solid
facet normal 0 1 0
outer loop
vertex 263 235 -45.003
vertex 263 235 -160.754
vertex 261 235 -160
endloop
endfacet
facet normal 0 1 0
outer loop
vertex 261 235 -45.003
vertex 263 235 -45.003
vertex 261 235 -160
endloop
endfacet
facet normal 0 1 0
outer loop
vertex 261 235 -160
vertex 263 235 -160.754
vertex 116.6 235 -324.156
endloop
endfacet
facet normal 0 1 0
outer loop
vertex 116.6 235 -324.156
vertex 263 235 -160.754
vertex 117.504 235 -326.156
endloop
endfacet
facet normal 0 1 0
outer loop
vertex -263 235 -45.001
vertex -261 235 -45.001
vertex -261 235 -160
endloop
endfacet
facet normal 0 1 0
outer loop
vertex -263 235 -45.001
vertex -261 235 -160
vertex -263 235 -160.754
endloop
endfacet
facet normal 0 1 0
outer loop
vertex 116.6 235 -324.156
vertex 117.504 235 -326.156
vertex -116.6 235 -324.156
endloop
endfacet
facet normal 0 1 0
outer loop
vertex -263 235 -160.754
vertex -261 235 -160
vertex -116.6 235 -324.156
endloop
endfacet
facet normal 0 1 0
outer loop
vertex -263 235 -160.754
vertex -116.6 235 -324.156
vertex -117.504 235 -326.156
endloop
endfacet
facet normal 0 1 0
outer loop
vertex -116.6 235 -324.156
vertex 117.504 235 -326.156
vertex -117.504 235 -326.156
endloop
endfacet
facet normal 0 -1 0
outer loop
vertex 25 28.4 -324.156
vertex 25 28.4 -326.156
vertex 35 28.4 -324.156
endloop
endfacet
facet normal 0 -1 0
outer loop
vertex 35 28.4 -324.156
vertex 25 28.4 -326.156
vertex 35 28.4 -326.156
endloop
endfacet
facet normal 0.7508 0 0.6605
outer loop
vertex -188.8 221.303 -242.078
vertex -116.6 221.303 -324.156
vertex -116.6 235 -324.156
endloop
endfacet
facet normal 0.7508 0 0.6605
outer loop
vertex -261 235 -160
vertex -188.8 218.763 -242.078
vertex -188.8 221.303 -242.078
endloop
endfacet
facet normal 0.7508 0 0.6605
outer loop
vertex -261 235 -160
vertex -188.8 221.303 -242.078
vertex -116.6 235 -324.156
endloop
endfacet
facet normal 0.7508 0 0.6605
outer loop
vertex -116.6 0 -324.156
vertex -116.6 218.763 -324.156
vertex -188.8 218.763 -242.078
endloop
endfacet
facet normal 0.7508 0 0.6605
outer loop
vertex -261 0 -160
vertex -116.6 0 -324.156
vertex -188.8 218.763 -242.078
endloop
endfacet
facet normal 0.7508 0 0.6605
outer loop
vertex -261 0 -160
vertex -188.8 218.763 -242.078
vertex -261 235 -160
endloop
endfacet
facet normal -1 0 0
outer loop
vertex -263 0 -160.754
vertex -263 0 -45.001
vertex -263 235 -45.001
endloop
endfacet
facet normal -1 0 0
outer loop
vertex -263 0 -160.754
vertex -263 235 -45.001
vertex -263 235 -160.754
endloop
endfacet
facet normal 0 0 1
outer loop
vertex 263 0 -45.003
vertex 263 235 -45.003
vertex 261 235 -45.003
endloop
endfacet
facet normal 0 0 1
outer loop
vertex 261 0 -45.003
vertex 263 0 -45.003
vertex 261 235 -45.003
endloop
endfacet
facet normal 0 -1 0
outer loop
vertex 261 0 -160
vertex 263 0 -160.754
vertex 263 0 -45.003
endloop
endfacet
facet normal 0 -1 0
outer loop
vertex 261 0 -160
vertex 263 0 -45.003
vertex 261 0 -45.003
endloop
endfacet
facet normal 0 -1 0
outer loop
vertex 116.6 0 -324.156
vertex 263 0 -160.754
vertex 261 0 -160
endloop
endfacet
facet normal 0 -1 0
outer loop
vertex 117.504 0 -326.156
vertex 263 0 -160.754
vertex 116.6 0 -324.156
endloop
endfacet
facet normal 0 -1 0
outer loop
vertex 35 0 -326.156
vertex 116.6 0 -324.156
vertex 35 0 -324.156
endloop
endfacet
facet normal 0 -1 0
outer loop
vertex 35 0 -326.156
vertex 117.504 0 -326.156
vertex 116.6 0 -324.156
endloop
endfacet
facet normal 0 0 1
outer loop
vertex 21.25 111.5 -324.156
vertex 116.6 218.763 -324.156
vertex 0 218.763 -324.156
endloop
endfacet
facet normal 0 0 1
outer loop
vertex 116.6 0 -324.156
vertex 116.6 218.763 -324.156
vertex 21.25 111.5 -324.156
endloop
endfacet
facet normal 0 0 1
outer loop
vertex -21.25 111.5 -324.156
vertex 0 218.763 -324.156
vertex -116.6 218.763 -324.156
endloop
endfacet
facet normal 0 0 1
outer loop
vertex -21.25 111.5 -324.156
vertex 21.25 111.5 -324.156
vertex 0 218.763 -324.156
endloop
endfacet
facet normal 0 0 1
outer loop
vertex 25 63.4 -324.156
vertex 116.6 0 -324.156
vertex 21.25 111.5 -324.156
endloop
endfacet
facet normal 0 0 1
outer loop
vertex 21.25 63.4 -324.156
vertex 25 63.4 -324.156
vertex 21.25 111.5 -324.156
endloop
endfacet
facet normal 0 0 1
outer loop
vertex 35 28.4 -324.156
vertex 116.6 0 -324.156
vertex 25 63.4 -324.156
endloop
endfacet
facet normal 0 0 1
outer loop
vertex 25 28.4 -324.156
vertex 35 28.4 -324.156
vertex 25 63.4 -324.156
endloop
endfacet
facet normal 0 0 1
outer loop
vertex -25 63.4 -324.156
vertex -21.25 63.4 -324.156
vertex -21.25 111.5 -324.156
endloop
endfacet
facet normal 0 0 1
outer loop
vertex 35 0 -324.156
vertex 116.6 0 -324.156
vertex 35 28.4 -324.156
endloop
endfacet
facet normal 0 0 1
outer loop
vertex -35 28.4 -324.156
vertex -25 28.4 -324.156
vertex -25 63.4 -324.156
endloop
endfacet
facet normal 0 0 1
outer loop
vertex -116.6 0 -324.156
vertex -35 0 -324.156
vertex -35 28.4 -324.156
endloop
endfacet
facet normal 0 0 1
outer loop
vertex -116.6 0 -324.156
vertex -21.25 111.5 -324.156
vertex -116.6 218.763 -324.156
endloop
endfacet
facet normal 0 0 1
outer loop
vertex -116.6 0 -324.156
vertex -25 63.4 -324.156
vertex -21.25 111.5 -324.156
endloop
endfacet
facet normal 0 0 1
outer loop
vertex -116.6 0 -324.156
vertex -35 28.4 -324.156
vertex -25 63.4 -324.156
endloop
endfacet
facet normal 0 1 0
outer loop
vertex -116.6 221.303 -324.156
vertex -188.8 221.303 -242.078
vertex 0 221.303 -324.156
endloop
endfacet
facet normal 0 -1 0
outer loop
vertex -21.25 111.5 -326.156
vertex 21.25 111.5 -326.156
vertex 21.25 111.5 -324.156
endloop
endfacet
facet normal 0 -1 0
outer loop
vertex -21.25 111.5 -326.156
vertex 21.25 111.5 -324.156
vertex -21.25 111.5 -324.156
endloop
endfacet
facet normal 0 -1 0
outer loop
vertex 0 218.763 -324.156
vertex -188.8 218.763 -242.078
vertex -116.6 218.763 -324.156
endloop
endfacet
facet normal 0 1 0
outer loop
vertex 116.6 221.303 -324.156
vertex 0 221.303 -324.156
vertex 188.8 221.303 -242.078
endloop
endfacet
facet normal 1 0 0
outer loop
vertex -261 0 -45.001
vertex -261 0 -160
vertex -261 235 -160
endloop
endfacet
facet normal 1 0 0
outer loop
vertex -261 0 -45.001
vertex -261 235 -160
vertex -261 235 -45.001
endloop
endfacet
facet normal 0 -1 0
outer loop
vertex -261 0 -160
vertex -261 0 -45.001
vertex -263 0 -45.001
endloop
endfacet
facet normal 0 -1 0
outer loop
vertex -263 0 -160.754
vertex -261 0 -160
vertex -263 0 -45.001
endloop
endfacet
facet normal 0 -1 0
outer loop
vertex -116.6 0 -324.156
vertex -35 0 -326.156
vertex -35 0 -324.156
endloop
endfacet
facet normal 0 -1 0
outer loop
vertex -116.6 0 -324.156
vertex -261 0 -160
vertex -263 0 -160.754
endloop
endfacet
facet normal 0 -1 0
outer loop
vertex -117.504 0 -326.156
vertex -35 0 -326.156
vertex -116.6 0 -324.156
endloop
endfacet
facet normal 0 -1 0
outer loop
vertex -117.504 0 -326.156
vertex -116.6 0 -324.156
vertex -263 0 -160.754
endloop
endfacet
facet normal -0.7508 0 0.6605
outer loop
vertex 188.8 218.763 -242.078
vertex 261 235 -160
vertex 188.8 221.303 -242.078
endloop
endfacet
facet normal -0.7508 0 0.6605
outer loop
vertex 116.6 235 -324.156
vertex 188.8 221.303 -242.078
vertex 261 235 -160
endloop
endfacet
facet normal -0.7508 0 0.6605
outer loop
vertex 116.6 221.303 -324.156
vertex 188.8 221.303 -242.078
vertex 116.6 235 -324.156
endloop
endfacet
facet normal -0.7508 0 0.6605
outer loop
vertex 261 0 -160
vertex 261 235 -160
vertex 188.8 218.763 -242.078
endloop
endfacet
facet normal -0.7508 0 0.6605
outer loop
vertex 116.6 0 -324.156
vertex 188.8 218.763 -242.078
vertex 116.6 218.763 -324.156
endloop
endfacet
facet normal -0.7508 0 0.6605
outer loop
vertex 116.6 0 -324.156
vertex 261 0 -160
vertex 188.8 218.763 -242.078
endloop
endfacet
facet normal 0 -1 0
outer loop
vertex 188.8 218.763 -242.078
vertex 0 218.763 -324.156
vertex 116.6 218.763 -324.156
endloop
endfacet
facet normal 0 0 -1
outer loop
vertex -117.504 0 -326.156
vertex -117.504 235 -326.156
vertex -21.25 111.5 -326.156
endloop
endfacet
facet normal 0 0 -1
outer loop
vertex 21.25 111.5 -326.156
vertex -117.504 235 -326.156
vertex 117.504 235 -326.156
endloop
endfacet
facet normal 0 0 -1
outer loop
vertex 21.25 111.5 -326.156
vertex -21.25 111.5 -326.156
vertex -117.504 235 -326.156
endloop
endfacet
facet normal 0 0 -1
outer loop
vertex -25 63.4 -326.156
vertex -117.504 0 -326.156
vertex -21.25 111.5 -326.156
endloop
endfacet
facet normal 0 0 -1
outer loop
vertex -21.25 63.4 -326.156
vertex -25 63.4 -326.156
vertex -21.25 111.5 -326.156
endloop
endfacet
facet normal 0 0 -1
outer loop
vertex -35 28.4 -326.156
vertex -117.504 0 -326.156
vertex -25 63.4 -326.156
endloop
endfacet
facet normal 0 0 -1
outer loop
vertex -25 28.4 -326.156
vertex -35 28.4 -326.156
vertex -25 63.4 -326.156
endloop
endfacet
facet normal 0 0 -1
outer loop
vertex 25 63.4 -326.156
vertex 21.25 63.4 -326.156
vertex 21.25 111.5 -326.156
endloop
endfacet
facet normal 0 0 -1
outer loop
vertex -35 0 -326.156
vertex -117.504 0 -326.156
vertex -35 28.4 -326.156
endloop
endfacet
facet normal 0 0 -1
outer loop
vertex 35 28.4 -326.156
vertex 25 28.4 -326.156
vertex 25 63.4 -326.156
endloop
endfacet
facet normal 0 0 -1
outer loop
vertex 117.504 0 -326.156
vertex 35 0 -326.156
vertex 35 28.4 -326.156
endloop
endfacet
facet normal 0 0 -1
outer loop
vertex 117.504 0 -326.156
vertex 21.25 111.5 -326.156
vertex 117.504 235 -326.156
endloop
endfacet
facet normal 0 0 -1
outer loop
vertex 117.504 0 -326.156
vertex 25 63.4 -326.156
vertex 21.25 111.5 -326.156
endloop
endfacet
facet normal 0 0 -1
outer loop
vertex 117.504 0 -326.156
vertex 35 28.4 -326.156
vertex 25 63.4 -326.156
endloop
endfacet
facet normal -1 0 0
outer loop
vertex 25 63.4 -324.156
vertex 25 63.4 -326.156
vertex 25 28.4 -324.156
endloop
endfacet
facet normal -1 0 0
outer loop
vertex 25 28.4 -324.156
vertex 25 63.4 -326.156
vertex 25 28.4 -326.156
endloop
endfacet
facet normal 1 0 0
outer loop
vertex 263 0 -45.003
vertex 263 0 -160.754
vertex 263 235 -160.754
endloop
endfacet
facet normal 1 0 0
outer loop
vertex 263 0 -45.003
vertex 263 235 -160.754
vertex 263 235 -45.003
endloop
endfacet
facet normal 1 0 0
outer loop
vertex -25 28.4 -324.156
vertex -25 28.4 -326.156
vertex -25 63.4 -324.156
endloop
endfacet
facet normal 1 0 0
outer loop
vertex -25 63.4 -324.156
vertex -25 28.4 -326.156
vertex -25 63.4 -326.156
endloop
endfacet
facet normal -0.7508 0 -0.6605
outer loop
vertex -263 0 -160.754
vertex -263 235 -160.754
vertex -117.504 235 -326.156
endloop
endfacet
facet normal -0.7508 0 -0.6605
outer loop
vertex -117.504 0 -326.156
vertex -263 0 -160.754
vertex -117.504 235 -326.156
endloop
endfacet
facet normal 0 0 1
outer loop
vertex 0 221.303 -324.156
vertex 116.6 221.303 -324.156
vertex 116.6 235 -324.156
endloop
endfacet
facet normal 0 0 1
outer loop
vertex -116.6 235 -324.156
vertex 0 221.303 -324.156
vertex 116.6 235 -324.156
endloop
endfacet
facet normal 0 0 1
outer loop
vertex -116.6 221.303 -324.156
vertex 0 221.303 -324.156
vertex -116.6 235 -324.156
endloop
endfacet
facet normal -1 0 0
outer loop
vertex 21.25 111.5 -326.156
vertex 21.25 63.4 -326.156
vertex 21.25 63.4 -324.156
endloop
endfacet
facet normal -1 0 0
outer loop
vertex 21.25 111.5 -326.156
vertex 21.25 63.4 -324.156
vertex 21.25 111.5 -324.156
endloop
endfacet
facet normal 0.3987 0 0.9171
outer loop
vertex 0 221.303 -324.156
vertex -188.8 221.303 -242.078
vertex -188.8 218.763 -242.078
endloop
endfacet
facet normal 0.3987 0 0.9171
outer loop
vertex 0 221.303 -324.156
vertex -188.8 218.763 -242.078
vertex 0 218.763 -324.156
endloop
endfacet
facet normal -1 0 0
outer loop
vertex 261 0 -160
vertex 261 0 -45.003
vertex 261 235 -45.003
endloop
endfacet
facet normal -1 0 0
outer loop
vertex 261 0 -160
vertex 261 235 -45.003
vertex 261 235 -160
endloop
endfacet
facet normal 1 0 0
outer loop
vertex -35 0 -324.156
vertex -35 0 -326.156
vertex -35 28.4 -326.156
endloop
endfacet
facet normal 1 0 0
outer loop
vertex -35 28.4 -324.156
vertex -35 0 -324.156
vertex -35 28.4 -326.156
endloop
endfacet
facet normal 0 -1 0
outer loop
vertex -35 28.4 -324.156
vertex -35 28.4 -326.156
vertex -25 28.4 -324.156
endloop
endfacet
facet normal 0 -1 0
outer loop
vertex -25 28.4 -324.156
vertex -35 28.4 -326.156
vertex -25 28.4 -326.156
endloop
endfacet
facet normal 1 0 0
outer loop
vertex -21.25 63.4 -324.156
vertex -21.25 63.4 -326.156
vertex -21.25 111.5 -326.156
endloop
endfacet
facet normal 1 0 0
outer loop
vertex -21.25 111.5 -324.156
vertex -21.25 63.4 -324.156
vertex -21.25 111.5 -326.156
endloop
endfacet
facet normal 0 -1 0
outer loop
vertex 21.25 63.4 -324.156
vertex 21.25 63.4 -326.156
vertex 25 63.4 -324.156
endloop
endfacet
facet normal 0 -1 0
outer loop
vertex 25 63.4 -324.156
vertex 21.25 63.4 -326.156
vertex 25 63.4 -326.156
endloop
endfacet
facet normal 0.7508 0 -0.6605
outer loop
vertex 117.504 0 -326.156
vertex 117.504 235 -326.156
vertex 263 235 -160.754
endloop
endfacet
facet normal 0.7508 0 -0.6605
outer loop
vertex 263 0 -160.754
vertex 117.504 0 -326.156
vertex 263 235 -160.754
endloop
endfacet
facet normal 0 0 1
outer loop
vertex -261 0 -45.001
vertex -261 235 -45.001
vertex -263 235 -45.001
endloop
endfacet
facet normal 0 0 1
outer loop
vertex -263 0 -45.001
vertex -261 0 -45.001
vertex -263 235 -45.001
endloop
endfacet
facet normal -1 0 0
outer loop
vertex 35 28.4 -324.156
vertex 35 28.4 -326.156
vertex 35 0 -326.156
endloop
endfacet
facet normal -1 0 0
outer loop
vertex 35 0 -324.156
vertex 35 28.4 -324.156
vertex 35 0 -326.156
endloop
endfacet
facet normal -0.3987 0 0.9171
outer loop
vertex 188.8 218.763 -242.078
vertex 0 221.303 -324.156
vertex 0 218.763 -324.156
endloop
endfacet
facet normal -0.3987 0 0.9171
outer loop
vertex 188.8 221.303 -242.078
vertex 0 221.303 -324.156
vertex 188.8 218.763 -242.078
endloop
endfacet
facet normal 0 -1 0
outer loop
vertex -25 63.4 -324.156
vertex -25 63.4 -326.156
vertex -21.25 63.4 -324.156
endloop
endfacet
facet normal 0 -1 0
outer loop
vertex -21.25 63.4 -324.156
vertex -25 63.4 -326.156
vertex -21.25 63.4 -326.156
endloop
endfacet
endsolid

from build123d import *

# Parameters (mm, degrees)
BOSS_EXTRUDE5_DEPTH = 234.9999999
SKETCH4_W           = 42.5
SKETCH4_H           = 48.09999997
CUT_EXTRUDE1_DEPTH  = 2.000000064
RIB1_REACH          = 504.592
SKETCH9_WALLS_W     = 1213.053497679
SKETCH9_WALLS_H     = 2.54
RIB2_REACH          = 504.592
SKETCH8_WALLS_W     = 1213.053497679
SKETCH8_WALLS_H     = 2.54


with BuildPart() as part:
    # Sketch1 → Boss-Extrude5 (new body)
    with BuildSketch(Plane(origin=(0, 0, 0), x_dir=(1, 0, 0), z_dir=(0, 1, 0))):
        Polygon((-117.504462868, 326.155640462), (117.504462868, 326.155640462), (263.000000064, 160.754471715), (263.000000064, 45.003453118), (261, 45.003453118), (261, 160), (116.600094822, 324.155640398), (-116.600094822, 324.155640398), (-261, 160), (-261, 45.001214275), (-263.000000064, 45.001214275), (-263.000000064, 160.754471715), align=None)
    extrude(amount=BOSS_EXTRUDE5_DEPTH)

    # Sketch4 → Cut-Extrude1 (cut)
    with BuildSketch(Plane(origin=(0, 0, -326.155640462), x_dir=(-1, 0, 0), z_dir=(0, 0, -1))):
        with Locations((0, 87.449999931)):
            Rectangle(SKETCH4_W, SKETCH4_H)
        Polygon((-25, 63.399999946), (-25, 28.4), (25, 28.4), (25, 63.399999946), (21.25, 63.399999946), (-21.25, 63.399999946), align=None)
        Polygon((-25, 28.4), (-35, 28.4), (-35, 0), (35, 0), (35, 28.4), (25, 28.4), align=None)
    extrude(amount=-CUT_EXTRUDE1_DEPTH, mode=Mode.SUBTRACT)

    # Sketch9 walls → Rib1 (add, up to next)
    with BuildSketch(Plane(origin=(118.5216607, 0, -272.630231957), x_dir=(0.917086319794662, 0, 0.39868870318267463), z_dir=(-0.39868870318267463, 0, 0.917086319794662)), mode=Mode.PRIVATE) as rib1_sk1:
        with Locations((-26.302471723, 220.03320014)):
            Rectangle(SKETCH9_WALLS_W, SKETCH9_WALLS_H)
    rib1_tool1 = extrude(rib1_sk1.sketch, amount=-RIB1_REACH, mode=Mode.PRIVATE) - part.part
    add(rib1_tool1.solids().sort_by_distance((94.400023705, 220.03320014, -283.116730299))[0])

    # Sketch8 walls → Rib2 (add, up to next)
    with BuildSketch(Plane(origin=(-118.5216607, 0, -272.630231957), x_dir=(0.9170863197945202, 0, -0.39868870318300126), z_dir=(0.3986887031830012, 0, 0.91708631979452)), mode=Mode.PRIVATE) as rib2_sk1:
        with Locations((26.302471723, 220.03320014)):
            Rectangle(SKETCH8_WALLS_W, SKETCH8_WALLS_H)
    rib2_tool1 = extrude(rib2_sk1.sketch, amount=-RIB2_REACH, mode=Mode.PRIVATE) - part.part
    add(rib2_tool1.solids().sort_by_distance((-94.400023705, 220.03320014, -283.116730299))[0])


solid = part.part
